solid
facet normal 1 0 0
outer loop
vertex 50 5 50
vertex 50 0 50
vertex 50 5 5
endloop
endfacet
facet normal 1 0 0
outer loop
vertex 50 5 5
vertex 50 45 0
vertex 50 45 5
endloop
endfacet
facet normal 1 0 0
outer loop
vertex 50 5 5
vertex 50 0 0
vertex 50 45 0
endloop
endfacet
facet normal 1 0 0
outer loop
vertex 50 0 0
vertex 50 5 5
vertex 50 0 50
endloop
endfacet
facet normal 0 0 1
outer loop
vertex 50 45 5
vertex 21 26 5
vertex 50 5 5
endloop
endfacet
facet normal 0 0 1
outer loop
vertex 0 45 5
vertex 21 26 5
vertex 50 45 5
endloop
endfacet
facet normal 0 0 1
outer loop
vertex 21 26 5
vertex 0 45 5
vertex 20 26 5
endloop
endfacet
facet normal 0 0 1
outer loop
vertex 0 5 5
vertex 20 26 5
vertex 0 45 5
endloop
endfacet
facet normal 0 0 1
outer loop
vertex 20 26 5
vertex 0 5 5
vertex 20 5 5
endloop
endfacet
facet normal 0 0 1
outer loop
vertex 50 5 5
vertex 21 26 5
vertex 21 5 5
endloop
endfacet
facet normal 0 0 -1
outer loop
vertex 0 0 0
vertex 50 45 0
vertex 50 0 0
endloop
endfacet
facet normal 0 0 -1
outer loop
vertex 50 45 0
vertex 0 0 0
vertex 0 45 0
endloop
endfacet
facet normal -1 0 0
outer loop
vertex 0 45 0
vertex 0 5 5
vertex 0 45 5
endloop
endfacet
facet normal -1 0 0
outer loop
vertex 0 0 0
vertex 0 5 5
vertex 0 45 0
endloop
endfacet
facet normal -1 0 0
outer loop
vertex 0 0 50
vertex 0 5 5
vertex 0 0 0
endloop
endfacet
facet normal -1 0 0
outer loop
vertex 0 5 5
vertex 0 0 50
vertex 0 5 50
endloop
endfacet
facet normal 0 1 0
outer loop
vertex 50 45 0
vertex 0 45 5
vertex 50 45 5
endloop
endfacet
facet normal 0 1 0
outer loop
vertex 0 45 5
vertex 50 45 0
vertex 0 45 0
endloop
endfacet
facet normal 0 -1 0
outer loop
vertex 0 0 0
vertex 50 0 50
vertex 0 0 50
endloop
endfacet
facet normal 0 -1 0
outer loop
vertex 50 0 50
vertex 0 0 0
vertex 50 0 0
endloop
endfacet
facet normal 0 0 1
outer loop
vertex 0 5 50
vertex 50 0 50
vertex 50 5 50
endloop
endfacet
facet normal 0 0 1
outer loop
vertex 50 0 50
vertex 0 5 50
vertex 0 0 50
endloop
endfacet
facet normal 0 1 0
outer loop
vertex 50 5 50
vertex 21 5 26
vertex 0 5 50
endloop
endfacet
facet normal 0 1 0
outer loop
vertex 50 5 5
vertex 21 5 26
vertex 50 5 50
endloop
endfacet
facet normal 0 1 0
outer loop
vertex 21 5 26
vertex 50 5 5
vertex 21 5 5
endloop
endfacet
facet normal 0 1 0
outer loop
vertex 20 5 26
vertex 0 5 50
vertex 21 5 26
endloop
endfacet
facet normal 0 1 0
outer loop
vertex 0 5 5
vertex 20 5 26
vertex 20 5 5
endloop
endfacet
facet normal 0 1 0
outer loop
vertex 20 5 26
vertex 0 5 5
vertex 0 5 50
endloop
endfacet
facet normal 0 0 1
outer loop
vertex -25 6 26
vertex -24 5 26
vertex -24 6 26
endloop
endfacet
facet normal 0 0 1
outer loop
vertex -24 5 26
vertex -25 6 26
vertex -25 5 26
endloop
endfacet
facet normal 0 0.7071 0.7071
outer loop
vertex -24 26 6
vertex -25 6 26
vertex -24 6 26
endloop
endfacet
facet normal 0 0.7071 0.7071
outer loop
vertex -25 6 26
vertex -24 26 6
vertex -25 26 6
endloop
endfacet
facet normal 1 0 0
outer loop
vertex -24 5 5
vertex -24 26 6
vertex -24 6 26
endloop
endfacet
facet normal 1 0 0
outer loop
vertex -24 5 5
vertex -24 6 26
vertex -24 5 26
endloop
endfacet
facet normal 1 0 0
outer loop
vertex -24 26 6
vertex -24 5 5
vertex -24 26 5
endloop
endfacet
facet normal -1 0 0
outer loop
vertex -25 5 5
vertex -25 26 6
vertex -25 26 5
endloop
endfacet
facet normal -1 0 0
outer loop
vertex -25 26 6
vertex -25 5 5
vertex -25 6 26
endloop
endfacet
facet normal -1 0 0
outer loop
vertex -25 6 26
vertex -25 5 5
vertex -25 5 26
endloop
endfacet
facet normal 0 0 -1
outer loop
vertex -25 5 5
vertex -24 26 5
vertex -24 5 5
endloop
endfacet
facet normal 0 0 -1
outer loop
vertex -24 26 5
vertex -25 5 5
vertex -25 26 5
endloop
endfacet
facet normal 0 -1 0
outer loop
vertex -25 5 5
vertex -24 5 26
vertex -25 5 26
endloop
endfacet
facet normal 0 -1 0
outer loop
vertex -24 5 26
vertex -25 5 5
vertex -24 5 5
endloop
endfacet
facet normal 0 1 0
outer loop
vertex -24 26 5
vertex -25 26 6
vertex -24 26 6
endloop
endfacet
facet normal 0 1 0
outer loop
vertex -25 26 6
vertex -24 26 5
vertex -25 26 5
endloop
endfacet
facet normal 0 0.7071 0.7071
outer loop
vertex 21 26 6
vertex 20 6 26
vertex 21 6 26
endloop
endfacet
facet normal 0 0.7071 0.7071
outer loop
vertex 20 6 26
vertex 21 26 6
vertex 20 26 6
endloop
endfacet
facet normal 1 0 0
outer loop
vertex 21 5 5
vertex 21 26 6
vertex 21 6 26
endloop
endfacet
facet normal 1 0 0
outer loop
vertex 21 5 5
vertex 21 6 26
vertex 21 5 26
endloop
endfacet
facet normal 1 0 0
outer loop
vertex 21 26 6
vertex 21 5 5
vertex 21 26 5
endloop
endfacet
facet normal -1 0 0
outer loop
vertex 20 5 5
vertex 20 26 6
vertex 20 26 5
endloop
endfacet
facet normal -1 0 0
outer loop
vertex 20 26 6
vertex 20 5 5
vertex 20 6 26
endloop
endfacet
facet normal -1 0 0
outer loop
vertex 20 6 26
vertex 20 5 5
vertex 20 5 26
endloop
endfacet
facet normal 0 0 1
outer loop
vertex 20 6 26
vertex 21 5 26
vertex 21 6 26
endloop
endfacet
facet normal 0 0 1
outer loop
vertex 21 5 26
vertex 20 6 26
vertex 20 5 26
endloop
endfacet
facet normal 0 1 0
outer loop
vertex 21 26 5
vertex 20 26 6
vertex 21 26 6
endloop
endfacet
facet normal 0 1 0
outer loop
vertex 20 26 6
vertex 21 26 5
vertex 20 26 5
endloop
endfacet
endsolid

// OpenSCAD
// L-shaped mounting bracket for NEMA 17 stepper motor
// Print orientation: base plate on bed (z = 0), builds upward

// Dimensions
base_x_min = -25;
base_x_max = 25;
base_y_min = 0;
base_y_max = 45;
base_z = 5;

motor_plate_x_min = -25;
motor_plate_x_max = 25;
motor_plate_y_min = 0;
motor_plate_y_max = 5;
motor_plate_z = 50;

// Hole positions
m4_hole_diameter = 4.5;
m4_hole1_x = -17;
m4_hole1_y = 30;
m4_hole2_x = 17;
m4_hole2_y = 30;

// Motor boss hole
boss_hole_diameter = 23;
boss_hole_center_x = 0;
boss_hole_center_z = 28;

// M3 screw holes for motor mounting
m3_hole_diameter = 3.4;
m3_screw_spacing = 31;
m3_hole_offset = m3_screw_spacing / 2;

// Gussets
gusset_thickness = 5;
gusset_leg_length = 20;
gusset_base_y = 5;
gusset_base_z = 5;

// Set resolution for smooth curves
$fn = 64;

// Main module
module bracket() {
    // Base plate (on XY plane, z = 0 to 5)
    translate([0, 0, 0])
        cube([base_x_max - base_x_min, base_y_max - base_y_min, base_z], center = false);

    // Motor plate (attached to back edge of base plate, y = 0 to 5, z = 0 to 50)
    translate([0, 0, 0])
        cube([motor_plate_x_max - motor_plate_x_min, motor_plate_y_max - motor_plate_y_min, motor_plate_z], center = false);

    // Cut boss hole through both plates (centered at x=0, z=28, y=0 to 5)
    difference() {
        // Union of base and motor plate
        union() {
            translate([0, 0, 0])
                cube([base_x_max - base_x_min, base_y_max - base_y_min, base_z], center = false);
            translate([0, 0, 0])
                cube([motor_plate_x_max - motor_plate_x_min, motor_plate_y_max - motor_plate_y_min, motor_plate_z], center = false);
        }

        // Boss hole: cylinder through both plates
        translate([boss_hole_center_x, 0, boss_hole_center_z])
            cylinder(h = base_z + motor_plate_z + 1, r = boss_hole_diameter / 2, center = true);
    }

    // Cut M3 screw holes through both plates (in a square around boss hole)
    for (i = [0:1:3]) {
        angle = i * 90;
        x_offset = m3_hole_offset * cos(angle * 3.141592653589793 / 180);
        y_offset = m3_hole_offset * sin(angle * 3.141592653589793 / 180);
        hole_x = boss_hole_center_x + x_offset;
        hole_z = boss_hole_center_z + y_offset;

        difference() {
            // Union of base and motor plate
            union() {
                translate([0, 0, 0])
                    cube([base_x_max - base_x_min, base_y_max - base_y_min, base_z], center = false);
                translate([0, 0, 0])
                    cube([motor_plate_x_max - motor_plate_x_min, motor_plate_y_max - motor_plate_y_min, motor_plate_z], center = false);
            }

            // M3 hole: cylinder through both plates
            translate([hole_x, 0, hole_z])
                cylinder(h = base_z + motor_plate_z + 1, r = m3_hole_diameter / 2, center = true);
        }
    }

    // Cut M4 through-holes in base plate (at y = 30, z = 0 to 5)
    difference() {
        // Base plate
        translate([0, 0, 0])
            cube([base_x_max - base_x_min, base_y_max - base_y_min, base_z], center = false);

        // M4 hole 1
        translate([m4_hole1_x, m4_hole1_y, base_z / 2])
            cylinder(h = base_z + 1, r = m4_hole_diameter / 2, center = true);

        // M4 hole 2
        translate([m4_hole2_x, m4_hole2_y, base_z / 2])
            cylinder(h = base_z + 1, r = m4_hole_diameter / 2, center = true);
    }

    // Gussets: right triangle in YZ plane, legs 20mm, thickness 5mm
    // Left gusset: x = -25 to -20, y = 5 to 25, z = 5 to 25
    // Right gusset: x = 20 to 25, y = 5 to 25, z = 5 to 25

    // Left gusset: right triangle in YZ plane, right angle at (y=5, z=5), extending +Y and +Z
    // Use hull to form the triangular prism
    hull() {
        translate([-25, 5, 5]) cube([1, 1, 1], center = false); // corner at (y=5, z=5)
        translate([-25, 5 + gusset_leg_length, 5]) cube([1, 1, 1], center = false); // (y=25, z=5)
        translate([-25, 5, 5 + gusset_leg_length]) cube([1, 1, 1], center = false); // (y=5, z=25)
    }

    // Right gusset: same shape but at x = 20 to 25
    hull() {
        translate([20, 5, 5]) cube([1, 1, 1], center = false);
        translate([20, 5 + gusset_leg_length, 5]) cube([1, 1, 1], center = false);
        translate([20, 5, 5 + gusset_leg_length]) cube([1, 1, 1], center = false);
    }
}

// Render the bracket
bracket();
